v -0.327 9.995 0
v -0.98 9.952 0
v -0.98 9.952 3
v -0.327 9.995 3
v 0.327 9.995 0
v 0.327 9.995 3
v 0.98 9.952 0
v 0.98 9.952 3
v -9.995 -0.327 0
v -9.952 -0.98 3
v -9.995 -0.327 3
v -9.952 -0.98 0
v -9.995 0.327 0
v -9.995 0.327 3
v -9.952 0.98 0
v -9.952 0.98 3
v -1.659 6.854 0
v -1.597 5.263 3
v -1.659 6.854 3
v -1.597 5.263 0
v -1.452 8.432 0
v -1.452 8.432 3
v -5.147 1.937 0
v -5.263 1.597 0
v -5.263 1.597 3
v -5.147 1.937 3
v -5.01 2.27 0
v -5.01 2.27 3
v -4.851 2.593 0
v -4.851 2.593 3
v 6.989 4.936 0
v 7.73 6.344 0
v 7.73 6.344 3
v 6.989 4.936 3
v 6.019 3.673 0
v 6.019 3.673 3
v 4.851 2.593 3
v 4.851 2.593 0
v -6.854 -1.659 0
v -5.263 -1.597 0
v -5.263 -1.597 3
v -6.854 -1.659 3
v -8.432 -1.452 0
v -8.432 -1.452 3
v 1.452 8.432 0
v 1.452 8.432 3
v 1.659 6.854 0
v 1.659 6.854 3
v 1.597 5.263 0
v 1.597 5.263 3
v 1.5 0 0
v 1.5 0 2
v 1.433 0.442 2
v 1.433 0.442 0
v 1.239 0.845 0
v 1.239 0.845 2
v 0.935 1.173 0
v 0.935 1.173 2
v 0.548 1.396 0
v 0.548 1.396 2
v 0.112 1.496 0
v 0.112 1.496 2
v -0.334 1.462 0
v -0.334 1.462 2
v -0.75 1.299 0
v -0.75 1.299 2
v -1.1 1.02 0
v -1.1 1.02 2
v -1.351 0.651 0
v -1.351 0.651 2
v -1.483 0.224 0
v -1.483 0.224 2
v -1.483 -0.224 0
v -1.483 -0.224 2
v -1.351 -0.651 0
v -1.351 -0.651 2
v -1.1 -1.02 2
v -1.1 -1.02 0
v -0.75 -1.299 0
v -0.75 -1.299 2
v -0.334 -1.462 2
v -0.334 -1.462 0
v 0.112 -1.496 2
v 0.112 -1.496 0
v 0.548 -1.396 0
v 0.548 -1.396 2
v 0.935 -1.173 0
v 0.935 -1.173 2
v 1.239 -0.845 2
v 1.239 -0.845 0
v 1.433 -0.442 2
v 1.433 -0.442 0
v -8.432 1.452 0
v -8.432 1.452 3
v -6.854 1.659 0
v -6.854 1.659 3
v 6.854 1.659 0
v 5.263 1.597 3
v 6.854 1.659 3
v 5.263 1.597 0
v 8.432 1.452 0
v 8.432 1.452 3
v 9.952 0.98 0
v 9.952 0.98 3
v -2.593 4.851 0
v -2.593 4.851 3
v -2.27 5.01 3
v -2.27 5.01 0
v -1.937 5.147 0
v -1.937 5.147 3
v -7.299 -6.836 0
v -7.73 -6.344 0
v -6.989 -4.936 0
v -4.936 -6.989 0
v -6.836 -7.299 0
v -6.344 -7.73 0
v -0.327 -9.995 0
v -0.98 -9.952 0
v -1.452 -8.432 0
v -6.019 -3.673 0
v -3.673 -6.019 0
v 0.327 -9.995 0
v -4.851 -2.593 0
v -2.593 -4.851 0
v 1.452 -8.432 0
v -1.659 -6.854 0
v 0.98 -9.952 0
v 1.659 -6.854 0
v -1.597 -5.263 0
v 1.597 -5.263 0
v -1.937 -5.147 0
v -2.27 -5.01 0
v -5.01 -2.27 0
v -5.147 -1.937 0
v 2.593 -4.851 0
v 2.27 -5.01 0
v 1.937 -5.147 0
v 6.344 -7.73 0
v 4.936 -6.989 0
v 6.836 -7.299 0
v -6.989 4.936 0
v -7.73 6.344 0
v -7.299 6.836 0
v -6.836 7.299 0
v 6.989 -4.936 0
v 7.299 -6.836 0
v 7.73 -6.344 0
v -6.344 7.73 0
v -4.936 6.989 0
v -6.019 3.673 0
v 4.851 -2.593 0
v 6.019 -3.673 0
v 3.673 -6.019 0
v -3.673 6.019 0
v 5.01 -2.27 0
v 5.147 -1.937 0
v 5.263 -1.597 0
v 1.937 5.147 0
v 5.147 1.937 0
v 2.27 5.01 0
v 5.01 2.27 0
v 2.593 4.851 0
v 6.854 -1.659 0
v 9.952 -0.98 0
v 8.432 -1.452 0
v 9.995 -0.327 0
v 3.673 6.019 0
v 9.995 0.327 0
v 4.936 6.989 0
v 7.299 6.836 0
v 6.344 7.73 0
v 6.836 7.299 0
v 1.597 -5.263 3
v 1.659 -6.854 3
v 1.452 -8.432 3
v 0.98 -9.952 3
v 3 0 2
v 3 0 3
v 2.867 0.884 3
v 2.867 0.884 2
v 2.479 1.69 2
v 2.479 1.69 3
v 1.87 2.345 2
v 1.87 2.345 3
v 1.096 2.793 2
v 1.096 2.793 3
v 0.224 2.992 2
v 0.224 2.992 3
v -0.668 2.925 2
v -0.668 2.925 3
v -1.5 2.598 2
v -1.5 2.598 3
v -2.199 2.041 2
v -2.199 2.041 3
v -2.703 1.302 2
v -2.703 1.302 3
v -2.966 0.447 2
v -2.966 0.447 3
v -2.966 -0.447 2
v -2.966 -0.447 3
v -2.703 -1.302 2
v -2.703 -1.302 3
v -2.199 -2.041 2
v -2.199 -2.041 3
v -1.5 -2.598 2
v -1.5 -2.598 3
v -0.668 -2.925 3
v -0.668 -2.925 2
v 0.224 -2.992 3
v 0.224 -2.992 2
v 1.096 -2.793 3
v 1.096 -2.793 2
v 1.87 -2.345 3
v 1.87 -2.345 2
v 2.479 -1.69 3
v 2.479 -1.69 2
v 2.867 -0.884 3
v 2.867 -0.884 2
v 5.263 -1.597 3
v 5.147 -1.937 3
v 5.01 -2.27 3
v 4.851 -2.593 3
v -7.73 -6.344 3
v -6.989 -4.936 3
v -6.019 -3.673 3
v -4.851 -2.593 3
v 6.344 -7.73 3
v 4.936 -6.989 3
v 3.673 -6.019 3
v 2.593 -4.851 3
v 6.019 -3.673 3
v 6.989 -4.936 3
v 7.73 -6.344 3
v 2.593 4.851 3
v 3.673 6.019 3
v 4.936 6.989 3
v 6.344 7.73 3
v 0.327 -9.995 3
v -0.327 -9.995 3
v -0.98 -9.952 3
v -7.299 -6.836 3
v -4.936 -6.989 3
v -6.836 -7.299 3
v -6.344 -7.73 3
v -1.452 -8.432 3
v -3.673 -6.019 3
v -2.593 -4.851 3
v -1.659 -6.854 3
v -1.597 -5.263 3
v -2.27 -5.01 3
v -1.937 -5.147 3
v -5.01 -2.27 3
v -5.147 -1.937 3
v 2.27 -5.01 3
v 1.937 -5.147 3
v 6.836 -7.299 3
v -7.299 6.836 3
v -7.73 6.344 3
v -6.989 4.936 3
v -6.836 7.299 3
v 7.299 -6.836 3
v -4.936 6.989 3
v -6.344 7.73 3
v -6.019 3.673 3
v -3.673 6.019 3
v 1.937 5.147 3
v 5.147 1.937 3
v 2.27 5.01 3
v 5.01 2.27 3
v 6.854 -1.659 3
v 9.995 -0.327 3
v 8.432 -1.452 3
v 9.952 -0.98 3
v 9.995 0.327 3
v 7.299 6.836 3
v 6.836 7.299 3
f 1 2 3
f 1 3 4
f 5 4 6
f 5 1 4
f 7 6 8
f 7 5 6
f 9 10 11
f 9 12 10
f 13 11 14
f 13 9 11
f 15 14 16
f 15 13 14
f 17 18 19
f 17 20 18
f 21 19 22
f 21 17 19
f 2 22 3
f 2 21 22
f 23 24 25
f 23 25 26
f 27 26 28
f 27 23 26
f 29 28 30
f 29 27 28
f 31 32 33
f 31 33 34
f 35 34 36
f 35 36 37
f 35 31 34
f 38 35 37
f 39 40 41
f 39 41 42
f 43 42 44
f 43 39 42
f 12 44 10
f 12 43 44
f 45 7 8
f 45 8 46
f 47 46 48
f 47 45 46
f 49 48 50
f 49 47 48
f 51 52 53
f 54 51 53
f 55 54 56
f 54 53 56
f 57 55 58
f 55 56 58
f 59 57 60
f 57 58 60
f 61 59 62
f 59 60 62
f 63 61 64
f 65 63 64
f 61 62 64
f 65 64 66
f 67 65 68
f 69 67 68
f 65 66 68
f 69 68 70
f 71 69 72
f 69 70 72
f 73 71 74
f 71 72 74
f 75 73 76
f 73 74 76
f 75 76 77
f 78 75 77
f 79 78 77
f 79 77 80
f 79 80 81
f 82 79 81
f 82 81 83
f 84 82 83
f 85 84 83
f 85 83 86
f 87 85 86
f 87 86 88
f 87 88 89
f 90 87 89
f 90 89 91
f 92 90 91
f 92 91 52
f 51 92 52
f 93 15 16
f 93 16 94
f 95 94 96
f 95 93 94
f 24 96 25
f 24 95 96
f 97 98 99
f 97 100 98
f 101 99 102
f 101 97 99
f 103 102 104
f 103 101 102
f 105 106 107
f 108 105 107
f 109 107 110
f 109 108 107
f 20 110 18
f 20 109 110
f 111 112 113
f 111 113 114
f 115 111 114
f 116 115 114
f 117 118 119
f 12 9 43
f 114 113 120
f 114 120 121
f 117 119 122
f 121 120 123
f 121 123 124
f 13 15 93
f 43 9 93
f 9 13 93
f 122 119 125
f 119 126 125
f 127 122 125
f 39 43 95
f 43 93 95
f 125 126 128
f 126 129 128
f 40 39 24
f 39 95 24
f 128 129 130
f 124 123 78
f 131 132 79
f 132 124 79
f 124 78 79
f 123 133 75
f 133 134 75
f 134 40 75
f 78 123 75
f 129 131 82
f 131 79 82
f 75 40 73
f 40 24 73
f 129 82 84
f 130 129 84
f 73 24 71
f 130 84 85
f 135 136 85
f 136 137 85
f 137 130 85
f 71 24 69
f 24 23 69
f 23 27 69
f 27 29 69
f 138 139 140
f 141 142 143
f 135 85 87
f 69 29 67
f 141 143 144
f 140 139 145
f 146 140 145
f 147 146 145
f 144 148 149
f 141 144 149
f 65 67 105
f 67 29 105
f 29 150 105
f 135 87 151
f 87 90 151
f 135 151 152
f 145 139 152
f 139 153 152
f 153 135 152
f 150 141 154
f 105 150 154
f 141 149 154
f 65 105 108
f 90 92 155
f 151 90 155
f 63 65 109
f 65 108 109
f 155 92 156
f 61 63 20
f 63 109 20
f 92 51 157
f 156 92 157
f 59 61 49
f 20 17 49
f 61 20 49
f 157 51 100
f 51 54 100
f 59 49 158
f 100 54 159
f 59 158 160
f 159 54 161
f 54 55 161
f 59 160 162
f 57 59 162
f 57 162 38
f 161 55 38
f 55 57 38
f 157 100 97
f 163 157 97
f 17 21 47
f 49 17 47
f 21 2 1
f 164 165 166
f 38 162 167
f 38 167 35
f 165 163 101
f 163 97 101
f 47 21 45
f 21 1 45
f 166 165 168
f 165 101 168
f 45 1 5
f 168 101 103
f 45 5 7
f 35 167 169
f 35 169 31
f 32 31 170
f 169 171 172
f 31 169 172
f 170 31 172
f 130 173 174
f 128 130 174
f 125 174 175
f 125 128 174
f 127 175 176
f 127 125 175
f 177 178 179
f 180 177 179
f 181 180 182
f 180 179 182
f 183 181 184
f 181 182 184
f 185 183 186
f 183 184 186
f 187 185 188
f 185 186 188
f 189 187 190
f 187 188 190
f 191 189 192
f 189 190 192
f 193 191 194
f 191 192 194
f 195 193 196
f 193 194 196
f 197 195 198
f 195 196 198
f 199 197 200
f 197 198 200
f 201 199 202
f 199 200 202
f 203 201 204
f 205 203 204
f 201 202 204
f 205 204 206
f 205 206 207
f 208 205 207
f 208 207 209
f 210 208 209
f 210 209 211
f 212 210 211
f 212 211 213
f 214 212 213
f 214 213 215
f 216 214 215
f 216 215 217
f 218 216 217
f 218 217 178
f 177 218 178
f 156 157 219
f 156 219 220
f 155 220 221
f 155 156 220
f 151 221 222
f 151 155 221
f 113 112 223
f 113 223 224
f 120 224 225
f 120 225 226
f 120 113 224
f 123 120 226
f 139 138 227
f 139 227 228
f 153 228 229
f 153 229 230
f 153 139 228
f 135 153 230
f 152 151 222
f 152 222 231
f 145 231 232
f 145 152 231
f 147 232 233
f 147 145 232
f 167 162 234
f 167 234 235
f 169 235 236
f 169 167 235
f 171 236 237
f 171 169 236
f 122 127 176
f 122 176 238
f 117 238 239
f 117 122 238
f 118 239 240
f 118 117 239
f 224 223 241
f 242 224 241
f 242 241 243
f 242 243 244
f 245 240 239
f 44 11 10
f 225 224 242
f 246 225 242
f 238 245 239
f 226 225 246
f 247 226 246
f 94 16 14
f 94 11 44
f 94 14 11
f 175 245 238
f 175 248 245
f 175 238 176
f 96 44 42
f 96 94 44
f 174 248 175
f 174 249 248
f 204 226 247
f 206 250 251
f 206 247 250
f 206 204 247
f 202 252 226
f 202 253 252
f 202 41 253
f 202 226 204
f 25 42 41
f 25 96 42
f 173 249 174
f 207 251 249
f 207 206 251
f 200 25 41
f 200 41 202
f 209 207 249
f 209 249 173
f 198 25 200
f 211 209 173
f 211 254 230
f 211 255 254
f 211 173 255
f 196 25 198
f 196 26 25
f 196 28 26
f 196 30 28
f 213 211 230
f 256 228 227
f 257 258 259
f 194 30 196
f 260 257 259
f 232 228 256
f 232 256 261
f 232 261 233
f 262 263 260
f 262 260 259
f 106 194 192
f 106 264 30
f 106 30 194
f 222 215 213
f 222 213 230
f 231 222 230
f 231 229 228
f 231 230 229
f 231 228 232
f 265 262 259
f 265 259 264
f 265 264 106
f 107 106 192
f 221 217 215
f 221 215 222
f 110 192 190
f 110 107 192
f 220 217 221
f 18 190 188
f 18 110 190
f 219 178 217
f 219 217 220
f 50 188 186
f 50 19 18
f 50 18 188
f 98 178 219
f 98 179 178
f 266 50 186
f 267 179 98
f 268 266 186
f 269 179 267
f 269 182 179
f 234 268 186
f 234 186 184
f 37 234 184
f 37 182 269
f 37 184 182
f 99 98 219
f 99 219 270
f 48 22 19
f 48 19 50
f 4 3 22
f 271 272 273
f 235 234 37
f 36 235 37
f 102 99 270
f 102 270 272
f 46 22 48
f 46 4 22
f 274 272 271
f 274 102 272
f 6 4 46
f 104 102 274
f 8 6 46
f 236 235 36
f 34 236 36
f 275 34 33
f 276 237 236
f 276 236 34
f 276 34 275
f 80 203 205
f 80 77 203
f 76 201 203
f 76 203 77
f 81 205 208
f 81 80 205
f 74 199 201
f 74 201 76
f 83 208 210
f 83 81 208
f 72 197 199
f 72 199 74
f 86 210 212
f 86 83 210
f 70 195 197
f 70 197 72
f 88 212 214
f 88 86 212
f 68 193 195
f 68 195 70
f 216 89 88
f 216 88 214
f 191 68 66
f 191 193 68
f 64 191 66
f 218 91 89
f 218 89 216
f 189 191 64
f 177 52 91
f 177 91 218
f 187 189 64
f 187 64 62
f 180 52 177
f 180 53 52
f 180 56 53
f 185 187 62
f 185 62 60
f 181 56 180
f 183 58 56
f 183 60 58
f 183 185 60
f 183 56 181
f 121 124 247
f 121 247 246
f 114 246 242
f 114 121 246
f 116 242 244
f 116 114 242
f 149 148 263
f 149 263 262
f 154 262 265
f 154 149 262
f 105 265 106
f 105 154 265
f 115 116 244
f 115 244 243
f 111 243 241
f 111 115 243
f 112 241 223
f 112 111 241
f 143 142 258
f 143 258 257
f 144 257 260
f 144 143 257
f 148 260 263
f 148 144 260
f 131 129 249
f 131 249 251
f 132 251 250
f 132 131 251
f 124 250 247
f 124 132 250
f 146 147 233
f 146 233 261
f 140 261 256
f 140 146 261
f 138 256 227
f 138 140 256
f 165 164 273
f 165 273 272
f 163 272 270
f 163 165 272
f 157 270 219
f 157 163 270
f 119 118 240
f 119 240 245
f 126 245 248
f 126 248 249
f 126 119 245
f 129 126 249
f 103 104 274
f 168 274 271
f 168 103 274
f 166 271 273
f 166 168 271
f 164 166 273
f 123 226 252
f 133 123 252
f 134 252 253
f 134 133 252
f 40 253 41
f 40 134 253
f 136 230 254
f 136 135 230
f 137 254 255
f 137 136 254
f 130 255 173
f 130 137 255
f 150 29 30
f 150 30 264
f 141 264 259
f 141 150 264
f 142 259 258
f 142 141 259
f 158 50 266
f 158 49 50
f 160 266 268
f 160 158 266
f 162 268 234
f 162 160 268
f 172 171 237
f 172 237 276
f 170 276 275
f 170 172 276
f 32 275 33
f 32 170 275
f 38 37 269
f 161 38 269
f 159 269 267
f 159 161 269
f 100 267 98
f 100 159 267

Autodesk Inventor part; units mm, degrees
sketch "Sketch1" plane through (0, 0, 0) normal (0, 0, 1) x (1, 0, 0)
  circle A0 centre (0, 0) radius 10
  dimension "d0" = 20
extrude "Extrusion1" add sketch "Sketch1" along normal blind 3
ref_plane "Work Plane2" through (0, 0, 1.5) normal (0, 0, 1) x (1, 0, 0)
sketch "Sketch2" plane through (0, 0, 0) normal (0, 0, -1) x (-1, 0, 0)
  circle A0 centre (0, 0) radius 10 projected
  circle A1 centre (0, 0) radius 8
  dimension "d3" = 16
surface extrude "Pitch Diameter" sketch "Sketch2" against normal through all shown no curves A1
ref_plane "Work Plane8" through (0, 0, 0) normal (0.9238795, 0.3826834, 0) x (0, 0, 1)
ref_plane "Work Plane9" through (0, 0, 0) normal (1, 0, 0) x (0, 1, 0)
spur gear teeth "Spur Gear" teeth 8 pitch diameter 16 tip diameter 20 root diameter 11 face width 3 start plane through (0, 0, 0) normal (0, 0, -1) x (-1, 0, 0)
sketch "Sketch3" plane through (0, 0, 3) normal (0, 0, 1) x (1, 0, 0)
  circle A0 centre (0, 0) radius 3
  dimension "d49" = 6
extrude "Extrusion2" cut sketch "Sketch3" against normal blind 1
sketch "Sketch4" plane through (0, 0, 2) normal (0, 0, 1) x (1, 0, 0)
  circle A0 centre (0, 0) radius 1.5
  dimension "d52" = 3
extrude "Extrusion3" cut sketch "Sketch4" against normal blind 2
equation "\"d0\" = da_da"
equation "\"d1\" = da_b"
equation "\"d3\" = da_d"
equation "\"d16\" = da_aw"
equation "\"d43\" = da_aw"
equation "\"d46\" = da_aw"
equation "\"da_da\" = 20"
equation "\"da_b\" = 3"
equation "\"da_d\" = 16"
equation "\"da_aw\" = 24"
properties part number "engrenagem8_3_furo_3DPrint"
